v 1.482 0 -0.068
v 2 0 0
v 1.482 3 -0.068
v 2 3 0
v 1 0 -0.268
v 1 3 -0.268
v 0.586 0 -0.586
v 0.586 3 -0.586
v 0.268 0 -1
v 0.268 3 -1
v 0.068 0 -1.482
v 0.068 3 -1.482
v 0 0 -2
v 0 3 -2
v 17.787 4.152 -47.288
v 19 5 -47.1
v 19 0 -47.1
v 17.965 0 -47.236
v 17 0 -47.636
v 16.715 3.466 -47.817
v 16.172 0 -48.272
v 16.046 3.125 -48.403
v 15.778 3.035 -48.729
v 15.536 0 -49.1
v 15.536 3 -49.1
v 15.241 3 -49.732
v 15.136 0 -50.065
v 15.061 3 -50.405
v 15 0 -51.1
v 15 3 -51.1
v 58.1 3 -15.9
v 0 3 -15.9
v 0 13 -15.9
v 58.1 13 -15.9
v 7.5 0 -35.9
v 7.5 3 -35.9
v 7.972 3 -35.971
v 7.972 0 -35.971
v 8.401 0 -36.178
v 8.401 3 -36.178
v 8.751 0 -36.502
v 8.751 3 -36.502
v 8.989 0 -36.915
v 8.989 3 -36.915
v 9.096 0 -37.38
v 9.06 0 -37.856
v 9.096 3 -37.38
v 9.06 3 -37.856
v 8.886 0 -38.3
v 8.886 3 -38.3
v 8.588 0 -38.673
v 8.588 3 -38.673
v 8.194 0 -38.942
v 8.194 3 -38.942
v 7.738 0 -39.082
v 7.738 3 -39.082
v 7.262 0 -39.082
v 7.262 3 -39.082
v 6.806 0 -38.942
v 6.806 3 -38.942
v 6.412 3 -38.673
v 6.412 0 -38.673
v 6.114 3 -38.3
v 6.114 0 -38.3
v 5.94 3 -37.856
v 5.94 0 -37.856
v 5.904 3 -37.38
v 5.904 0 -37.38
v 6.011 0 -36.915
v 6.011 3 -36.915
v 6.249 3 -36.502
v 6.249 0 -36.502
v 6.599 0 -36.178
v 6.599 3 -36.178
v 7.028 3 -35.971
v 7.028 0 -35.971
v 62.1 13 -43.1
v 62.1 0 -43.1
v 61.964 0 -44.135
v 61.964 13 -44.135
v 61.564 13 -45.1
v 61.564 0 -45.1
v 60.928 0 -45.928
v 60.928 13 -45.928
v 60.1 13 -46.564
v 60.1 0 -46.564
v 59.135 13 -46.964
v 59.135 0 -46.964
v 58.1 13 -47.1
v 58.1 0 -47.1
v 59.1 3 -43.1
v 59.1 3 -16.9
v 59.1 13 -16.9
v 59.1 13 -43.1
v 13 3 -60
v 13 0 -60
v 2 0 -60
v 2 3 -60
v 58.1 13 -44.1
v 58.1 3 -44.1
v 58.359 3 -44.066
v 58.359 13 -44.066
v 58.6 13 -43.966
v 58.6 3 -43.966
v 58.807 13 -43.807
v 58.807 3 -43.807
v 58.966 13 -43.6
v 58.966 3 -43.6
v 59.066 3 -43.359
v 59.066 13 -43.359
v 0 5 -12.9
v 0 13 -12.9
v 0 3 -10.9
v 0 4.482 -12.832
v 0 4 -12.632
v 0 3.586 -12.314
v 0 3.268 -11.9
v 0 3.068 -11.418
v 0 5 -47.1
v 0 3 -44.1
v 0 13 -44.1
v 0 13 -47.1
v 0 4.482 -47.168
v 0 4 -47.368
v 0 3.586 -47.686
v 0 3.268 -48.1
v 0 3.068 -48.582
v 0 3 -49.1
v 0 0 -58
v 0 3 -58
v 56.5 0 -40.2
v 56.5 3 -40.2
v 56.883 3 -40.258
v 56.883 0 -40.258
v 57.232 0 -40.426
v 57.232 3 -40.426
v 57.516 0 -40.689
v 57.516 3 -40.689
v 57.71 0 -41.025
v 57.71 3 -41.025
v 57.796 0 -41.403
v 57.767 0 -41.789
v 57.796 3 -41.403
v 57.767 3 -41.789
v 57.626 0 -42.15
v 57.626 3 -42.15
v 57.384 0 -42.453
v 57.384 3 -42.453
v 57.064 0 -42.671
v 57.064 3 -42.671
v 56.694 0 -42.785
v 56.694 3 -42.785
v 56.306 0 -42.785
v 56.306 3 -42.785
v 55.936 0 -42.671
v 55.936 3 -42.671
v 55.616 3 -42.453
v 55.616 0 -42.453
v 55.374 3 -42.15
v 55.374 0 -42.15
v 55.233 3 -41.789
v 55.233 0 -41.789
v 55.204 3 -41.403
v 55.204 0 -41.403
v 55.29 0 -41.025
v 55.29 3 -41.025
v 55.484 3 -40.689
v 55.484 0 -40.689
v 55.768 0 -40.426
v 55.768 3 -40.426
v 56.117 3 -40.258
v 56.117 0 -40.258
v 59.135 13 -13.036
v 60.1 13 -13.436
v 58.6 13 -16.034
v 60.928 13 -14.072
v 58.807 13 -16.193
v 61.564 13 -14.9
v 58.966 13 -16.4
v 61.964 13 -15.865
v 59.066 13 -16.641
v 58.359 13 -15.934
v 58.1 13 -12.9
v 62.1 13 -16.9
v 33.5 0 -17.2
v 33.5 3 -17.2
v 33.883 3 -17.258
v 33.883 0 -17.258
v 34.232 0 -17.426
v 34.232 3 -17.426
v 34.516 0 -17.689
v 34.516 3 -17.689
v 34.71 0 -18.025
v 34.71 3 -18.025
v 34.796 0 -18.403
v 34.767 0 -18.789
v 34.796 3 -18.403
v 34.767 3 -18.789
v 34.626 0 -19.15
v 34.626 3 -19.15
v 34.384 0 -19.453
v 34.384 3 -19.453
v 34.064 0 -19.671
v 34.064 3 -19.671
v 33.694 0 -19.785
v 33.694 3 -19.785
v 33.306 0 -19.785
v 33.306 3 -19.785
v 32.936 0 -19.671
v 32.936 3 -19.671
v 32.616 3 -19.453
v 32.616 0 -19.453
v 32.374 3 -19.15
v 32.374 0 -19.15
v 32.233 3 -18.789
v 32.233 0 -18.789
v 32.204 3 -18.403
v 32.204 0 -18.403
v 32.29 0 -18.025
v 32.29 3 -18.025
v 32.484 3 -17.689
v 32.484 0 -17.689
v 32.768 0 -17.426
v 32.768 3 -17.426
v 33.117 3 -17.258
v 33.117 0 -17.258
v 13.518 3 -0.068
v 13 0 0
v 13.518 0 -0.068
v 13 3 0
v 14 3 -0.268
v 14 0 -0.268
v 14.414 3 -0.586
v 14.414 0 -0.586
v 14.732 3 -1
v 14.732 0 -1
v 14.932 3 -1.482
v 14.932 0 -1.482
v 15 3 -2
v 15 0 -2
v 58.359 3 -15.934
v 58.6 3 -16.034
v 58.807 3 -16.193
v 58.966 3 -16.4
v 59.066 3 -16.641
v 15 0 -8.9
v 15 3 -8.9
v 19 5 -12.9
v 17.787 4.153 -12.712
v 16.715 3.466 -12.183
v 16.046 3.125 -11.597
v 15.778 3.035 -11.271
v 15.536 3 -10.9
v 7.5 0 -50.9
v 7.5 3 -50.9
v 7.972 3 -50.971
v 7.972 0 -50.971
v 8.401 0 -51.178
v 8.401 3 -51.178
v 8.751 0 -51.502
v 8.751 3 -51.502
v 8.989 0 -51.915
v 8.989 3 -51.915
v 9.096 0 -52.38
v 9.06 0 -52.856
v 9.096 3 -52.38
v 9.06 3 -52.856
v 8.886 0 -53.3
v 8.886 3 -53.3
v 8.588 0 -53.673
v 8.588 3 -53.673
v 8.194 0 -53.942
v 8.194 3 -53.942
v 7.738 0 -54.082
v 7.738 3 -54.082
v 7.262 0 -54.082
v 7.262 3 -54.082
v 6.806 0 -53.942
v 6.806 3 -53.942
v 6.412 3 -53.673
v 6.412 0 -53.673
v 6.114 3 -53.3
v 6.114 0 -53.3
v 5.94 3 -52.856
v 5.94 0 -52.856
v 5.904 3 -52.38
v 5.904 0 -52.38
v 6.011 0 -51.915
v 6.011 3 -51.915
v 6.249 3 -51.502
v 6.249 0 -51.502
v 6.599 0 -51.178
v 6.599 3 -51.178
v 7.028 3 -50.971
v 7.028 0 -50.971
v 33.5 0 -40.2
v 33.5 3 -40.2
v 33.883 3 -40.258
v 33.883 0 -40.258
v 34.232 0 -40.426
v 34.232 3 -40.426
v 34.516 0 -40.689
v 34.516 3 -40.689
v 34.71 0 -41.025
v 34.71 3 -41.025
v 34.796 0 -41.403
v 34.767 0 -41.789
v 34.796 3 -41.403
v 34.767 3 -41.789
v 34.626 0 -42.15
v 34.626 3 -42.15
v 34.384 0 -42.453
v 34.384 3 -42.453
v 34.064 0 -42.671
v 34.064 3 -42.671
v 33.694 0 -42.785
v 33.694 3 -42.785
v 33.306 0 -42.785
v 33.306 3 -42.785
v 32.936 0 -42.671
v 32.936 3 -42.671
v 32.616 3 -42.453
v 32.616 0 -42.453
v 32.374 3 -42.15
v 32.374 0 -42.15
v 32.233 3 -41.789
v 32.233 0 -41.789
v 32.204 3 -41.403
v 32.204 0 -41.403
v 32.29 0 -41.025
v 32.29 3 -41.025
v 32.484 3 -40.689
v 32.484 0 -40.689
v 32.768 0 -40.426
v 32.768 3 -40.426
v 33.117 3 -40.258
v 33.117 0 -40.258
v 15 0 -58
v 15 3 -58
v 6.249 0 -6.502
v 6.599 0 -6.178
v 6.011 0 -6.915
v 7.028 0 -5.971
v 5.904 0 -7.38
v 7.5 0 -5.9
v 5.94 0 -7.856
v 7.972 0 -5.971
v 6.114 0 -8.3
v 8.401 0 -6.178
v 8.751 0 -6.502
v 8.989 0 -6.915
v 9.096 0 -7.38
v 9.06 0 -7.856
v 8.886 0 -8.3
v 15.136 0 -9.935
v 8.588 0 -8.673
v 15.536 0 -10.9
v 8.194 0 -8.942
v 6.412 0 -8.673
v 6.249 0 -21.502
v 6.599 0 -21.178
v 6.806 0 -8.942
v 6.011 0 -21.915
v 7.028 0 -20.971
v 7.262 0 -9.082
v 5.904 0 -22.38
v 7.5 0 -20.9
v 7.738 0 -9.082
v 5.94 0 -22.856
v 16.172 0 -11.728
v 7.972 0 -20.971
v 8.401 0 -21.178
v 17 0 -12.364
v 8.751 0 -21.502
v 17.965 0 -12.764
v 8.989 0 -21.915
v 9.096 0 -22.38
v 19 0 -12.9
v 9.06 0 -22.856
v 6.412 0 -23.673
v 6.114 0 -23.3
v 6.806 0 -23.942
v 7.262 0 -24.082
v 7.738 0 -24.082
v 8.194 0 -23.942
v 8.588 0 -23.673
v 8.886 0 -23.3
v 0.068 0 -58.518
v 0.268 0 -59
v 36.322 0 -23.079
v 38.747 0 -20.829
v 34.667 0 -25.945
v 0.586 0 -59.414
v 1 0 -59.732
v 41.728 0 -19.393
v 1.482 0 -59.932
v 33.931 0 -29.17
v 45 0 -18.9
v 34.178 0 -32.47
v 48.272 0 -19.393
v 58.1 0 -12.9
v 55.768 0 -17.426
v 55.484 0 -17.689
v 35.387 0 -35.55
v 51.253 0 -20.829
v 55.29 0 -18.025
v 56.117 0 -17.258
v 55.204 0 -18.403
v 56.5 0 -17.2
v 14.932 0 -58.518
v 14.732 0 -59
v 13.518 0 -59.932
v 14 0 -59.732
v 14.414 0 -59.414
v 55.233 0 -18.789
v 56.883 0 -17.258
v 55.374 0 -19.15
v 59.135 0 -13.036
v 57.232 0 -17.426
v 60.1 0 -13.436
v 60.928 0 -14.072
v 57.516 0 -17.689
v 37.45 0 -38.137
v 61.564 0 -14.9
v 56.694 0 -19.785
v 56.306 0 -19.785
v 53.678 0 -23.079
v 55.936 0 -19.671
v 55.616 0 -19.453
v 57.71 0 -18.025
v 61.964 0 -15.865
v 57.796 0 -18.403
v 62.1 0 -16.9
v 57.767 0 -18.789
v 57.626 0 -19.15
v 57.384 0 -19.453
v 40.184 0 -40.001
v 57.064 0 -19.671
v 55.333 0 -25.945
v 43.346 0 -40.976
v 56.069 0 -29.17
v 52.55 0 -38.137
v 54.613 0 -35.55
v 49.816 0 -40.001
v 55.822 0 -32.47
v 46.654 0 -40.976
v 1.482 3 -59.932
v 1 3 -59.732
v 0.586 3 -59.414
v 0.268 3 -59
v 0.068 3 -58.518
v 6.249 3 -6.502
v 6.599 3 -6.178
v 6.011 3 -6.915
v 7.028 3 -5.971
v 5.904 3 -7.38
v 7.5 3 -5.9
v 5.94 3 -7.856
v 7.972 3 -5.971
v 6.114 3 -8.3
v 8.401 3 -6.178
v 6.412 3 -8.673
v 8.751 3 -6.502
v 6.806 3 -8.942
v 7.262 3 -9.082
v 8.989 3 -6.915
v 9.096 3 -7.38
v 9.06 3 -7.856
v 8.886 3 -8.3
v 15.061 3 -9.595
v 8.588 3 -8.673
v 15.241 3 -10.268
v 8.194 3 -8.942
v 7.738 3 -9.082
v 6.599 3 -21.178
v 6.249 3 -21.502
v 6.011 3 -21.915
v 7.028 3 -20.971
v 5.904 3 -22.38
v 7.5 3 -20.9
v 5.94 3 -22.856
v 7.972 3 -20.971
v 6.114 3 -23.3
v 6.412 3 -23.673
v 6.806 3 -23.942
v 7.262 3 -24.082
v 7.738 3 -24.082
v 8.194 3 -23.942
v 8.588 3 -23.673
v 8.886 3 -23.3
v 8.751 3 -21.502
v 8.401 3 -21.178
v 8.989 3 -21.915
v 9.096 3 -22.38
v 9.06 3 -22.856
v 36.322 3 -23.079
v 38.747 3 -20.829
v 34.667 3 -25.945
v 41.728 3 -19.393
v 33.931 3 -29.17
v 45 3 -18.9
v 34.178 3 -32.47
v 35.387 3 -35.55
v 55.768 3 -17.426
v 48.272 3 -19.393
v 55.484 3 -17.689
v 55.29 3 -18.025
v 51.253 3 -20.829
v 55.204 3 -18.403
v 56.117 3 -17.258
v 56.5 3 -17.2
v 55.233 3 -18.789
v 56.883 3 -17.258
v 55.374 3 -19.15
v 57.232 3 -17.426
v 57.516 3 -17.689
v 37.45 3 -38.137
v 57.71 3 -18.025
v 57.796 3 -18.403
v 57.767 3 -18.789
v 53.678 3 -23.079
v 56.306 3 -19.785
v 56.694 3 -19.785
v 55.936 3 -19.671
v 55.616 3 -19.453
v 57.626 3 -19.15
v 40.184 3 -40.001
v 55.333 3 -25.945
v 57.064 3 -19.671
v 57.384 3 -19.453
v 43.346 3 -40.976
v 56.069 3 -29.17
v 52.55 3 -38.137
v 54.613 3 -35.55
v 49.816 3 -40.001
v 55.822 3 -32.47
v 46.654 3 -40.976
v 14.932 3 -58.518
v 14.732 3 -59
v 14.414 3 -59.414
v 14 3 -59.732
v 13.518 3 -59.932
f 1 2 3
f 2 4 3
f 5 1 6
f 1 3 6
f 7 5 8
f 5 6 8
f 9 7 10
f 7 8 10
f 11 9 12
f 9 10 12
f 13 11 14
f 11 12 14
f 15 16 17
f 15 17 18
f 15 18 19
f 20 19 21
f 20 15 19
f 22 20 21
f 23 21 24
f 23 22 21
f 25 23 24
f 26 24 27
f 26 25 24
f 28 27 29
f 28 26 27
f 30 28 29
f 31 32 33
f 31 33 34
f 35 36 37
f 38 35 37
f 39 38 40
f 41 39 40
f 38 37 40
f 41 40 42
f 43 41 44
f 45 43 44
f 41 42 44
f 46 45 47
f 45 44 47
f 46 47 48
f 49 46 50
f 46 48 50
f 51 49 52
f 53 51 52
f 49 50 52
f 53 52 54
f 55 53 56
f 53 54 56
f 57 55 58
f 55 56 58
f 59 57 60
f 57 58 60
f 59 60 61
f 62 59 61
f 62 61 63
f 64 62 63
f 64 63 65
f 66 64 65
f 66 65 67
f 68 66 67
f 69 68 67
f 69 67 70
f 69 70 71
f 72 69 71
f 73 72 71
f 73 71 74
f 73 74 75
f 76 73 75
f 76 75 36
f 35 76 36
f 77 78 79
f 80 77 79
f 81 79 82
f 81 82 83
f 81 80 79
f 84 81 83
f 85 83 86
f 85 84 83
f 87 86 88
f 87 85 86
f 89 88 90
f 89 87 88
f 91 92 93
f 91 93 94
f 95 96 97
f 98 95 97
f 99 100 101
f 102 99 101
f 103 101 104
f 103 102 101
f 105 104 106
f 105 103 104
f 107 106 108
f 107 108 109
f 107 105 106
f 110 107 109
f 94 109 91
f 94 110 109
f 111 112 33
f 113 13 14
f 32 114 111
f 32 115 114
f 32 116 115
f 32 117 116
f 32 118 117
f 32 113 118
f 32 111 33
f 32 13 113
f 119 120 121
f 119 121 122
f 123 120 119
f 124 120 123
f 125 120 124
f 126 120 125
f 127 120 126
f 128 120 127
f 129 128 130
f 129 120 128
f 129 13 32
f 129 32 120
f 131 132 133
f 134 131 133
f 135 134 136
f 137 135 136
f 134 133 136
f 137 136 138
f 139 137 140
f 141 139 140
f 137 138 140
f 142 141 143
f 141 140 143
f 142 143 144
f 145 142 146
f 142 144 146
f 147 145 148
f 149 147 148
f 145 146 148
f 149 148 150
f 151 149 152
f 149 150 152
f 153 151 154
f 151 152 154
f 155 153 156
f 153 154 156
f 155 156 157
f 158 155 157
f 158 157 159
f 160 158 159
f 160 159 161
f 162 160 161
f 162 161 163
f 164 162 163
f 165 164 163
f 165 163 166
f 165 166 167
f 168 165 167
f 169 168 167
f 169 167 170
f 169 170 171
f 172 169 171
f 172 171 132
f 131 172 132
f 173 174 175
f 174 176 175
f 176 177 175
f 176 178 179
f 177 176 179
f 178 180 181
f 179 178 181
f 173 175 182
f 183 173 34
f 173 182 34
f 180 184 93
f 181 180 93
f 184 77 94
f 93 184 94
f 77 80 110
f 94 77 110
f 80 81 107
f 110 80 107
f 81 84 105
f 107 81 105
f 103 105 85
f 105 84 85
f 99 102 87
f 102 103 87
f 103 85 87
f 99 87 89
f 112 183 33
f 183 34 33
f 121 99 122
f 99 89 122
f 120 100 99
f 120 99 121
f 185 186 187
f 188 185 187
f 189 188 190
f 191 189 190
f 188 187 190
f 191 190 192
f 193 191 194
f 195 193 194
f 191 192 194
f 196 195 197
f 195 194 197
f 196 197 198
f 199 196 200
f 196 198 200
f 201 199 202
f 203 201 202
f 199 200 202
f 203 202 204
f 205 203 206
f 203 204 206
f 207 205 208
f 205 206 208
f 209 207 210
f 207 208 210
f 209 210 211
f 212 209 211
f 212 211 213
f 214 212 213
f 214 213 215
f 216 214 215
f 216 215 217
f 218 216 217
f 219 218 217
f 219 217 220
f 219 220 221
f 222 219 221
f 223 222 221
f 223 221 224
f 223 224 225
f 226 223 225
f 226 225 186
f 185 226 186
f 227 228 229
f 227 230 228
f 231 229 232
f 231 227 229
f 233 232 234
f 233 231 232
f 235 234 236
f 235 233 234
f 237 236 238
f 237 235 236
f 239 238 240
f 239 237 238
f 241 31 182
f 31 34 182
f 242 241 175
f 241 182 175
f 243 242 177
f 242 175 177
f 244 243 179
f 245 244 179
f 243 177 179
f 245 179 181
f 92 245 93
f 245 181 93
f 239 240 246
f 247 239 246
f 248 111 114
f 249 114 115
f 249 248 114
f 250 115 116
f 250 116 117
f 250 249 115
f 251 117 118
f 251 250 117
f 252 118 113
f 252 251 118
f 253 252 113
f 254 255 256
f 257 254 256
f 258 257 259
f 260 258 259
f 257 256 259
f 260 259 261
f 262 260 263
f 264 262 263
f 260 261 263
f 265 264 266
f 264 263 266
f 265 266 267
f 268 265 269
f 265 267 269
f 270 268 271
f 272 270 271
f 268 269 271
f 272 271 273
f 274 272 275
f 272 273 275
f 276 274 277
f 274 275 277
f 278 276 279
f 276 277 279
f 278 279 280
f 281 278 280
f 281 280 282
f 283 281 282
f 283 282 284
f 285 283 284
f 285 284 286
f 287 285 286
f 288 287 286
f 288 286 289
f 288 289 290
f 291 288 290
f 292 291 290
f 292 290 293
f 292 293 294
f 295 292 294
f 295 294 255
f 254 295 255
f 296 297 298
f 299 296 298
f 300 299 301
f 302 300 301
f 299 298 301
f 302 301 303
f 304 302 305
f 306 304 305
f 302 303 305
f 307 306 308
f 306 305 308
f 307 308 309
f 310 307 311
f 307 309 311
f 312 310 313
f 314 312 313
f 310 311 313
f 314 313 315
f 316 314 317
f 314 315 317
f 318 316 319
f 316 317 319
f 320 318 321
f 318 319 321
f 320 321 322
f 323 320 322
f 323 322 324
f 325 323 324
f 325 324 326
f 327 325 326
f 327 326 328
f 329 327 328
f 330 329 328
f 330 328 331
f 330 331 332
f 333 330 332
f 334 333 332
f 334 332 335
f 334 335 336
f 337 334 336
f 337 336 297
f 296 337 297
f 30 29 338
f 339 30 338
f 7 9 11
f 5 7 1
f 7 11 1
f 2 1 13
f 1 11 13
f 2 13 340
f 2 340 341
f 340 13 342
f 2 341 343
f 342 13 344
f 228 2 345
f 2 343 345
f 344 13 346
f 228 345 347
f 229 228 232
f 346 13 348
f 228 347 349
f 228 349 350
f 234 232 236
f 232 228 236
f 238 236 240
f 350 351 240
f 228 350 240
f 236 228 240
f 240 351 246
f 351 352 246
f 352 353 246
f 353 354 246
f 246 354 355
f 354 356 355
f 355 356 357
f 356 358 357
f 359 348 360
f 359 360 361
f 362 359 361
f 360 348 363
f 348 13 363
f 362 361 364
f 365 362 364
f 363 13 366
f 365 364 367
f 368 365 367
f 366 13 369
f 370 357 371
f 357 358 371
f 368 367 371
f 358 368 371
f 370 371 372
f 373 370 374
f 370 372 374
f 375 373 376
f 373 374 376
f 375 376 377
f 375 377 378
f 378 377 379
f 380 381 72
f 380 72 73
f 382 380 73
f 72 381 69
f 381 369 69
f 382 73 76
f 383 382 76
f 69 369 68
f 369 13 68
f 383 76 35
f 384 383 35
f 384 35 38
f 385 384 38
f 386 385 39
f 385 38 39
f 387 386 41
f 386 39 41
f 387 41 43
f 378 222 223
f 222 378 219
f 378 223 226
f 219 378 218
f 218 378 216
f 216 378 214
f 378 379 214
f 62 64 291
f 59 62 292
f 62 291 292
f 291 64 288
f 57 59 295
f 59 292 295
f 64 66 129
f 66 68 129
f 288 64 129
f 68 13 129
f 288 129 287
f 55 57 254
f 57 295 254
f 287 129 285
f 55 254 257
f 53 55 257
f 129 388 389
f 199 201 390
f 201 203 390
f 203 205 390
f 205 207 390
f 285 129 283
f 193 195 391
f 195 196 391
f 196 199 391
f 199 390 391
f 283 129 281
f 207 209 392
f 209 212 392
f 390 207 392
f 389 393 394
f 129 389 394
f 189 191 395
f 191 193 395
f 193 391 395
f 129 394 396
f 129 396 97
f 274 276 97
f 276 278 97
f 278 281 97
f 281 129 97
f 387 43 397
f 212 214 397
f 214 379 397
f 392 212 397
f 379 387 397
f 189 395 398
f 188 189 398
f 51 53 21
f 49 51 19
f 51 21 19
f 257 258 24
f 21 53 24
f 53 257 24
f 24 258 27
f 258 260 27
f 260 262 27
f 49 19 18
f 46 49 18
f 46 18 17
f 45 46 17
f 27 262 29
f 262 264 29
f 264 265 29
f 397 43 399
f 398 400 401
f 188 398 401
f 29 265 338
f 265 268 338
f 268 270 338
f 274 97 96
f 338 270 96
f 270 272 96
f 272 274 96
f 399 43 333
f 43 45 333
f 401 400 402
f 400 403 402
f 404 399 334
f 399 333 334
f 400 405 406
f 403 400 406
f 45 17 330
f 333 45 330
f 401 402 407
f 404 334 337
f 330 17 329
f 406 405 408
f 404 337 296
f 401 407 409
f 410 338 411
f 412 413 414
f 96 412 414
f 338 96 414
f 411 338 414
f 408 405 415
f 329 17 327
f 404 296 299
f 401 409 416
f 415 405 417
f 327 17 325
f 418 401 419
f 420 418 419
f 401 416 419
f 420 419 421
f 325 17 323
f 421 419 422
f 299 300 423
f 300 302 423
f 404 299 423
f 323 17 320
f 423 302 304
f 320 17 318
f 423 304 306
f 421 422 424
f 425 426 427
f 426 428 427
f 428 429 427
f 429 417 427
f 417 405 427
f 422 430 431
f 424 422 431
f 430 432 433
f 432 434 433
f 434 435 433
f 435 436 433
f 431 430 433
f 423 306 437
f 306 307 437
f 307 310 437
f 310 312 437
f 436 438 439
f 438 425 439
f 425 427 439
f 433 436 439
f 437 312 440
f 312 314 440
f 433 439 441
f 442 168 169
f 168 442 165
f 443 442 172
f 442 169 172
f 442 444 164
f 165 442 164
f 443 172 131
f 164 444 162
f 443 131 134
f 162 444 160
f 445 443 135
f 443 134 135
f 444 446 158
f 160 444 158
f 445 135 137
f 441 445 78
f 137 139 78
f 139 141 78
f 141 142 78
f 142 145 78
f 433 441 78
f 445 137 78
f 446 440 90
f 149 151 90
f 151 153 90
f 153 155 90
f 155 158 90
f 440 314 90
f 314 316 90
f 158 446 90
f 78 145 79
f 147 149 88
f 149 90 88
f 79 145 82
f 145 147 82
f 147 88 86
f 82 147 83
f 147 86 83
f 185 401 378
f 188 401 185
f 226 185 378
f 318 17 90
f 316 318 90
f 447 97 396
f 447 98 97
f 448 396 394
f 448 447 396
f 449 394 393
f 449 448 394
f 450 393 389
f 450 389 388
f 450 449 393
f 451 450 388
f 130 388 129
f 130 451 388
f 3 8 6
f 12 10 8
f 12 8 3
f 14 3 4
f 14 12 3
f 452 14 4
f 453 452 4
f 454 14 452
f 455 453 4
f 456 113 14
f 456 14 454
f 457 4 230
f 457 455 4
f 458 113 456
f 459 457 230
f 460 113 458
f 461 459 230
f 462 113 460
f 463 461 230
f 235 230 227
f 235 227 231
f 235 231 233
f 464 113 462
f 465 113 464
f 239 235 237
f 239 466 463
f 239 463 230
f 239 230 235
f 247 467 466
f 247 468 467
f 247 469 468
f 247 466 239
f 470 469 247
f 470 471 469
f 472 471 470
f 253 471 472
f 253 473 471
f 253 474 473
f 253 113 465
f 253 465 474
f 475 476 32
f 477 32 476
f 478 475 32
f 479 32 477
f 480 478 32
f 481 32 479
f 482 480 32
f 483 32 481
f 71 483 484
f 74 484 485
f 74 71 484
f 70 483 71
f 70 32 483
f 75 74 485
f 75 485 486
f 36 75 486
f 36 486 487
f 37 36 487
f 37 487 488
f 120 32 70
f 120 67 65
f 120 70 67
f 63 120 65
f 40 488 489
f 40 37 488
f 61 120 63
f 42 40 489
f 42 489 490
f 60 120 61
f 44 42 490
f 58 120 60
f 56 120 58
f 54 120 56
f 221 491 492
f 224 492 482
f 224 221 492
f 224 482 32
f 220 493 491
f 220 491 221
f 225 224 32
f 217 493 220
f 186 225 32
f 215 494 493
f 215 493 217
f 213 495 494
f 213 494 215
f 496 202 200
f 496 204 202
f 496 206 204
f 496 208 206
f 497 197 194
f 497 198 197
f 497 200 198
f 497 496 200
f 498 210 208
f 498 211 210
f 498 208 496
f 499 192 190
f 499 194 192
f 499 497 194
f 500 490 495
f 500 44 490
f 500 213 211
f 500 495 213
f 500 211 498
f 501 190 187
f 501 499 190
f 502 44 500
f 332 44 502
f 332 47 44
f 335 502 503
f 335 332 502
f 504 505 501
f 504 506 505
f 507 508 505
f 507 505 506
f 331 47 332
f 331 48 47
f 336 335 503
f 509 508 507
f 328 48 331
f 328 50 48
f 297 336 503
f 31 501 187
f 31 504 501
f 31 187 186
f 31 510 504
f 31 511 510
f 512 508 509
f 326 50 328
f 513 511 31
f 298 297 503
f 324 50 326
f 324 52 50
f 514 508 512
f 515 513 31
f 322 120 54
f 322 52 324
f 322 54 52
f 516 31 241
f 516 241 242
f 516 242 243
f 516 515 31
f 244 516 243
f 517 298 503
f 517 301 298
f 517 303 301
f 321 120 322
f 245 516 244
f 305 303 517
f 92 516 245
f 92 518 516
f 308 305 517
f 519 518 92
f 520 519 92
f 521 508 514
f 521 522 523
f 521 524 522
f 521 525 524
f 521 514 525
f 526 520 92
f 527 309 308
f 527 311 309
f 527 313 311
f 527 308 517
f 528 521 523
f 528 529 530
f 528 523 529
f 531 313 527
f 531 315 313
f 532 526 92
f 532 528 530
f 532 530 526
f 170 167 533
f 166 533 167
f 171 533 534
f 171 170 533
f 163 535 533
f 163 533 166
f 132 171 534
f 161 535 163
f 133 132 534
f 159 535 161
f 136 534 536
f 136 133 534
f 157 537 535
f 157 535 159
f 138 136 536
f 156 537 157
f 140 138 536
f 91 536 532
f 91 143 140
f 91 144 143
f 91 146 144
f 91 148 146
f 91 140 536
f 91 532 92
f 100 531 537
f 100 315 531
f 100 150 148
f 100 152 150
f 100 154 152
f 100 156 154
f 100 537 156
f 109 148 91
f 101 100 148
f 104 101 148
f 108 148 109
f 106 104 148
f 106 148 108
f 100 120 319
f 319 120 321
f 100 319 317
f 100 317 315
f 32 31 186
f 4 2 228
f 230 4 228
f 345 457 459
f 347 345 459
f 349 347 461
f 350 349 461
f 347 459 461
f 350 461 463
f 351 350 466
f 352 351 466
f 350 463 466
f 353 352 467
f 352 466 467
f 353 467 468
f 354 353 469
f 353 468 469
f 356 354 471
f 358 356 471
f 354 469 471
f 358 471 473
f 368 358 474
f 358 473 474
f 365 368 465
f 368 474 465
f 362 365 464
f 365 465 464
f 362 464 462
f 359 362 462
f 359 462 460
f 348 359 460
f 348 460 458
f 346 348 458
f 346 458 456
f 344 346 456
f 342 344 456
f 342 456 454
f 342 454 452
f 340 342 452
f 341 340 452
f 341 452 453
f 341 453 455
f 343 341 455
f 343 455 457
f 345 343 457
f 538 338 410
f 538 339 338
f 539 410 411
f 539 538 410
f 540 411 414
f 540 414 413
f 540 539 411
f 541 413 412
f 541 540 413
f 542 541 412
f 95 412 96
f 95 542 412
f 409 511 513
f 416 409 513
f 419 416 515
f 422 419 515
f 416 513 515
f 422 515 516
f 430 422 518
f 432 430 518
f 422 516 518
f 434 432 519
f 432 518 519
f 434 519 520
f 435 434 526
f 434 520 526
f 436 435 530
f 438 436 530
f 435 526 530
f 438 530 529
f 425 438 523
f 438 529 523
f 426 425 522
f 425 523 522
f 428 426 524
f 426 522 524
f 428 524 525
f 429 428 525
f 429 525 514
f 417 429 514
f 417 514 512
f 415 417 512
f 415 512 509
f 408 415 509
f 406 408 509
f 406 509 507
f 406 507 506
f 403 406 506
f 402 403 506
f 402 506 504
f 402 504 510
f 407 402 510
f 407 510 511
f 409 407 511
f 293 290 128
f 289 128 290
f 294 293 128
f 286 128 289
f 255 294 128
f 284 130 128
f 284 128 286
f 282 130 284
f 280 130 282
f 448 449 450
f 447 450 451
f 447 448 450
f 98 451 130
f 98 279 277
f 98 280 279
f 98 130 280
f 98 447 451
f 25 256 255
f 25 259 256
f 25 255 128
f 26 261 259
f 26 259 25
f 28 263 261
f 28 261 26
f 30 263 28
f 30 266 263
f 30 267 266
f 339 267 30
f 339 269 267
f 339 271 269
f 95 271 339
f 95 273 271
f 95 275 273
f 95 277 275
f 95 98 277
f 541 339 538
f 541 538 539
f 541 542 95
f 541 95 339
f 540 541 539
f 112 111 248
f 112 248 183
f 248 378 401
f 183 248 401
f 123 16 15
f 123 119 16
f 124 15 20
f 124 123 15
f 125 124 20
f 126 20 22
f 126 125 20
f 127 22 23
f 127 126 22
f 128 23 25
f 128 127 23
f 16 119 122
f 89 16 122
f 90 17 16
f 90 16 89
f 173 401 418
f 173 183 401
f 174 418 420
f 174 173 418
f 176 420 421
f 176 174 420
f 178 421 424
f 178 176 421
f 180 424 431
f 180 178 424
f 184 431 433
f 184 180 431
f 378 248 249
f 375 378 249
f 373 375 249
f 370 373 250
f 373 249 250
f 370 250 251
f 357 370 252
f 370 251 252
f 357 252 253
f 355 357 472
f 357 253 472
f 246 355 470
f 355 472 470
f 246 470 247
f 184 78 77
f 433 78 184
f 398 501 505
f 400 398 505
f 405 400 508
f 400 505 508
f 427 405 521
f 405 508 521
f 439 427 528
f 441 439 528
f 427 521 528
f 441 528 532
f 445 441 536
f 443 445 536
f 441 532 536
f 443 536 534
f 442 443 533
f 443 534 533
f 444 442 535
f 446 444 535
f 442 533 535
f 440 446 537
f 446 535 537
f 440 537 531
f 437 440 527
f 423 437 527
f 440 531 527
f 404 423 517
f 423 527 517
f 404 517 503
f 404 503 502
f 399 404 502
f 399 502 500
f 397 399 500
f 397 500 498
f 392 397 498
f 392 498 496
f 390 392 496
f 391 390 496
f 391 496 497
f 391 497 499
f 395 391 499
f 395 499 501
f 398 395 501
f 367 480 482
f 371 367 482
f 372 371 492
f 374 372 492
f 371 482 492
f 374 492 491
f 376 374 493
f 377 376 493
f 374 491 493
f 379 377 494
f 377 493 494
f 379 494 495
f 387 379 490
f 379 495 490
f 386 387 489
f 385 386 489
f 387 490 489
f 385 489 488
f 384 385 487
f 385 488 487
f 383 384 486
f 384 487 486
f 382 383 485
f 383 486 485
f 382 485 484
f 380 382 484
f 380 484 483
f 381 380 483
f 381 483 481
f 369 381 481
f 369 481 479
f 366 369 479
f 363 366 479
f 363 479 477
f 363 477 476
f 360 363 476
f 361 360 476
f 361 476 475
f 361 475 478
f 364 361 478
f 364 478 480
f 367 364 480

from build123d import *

# Parameters (mm, degrees)
BOSS_EXTRUDE1_DEPTH = 3
SKETCH2_R           = 1.6
CUT_EXTRUDE1_DEPTH  = 87.402604127
BOSS_EXTRUDE2_DEPTH = 10
CUT_EXTRUDE2_REACH  = 88.928
SKETCH5_R           = 11.1
CUT_EXTRUDE3_REACH  = 88.928
SKETCH6_R           = 1.3
FILLET1_R           = 1
FILLET2_R           = 4
FILLET3_R           = 4
FILLET4_R           = 2
FILLET5_R           = 2


with BuildPart() as part:
    # Sketch1 → Boss-Extrude1 (new body)
    with BuildSketch(Plane(origin=(0, 0, 0), x_dir=(1, 0, 0), z_dir=(0, 1, 0))):
        Polygon((0, 0), (15, 0), (15, 12.9), (62.1, 12.9), (62.1, 47.1), (15, 47.1), (15, 60), (0, 60), align=None)
    extrude(amount=BOSS_EXTRUDE1_DEPTH)

    # Sketch2 → Cut-Extrude1 (cut, through all)
    with BuildSketch(Plane(origin=(0, 3, 0), x_dir=(1, 0, 0), z_dir=(0, 1, 0))):
        with Locations(Location((7.5, 52.5, 0), (0, 0, 270))):
            Circle(SKETCH2_R)
        with Locations(Location((7.5, 37.5, 0), (0, 0, 270))):
            Circle(SKETCH2_R)
        with Locations(Location((7.5, 7.5, 0), (0, 0, 270))):
            Circle(SKETCH2_R)
        with Locations(Location((7.5, 22.5, 0), (0, 0, 270))):
            Circle(SKETCH2_R)
    extrude(amount=-CUT_EXTRUDE1_DEPTH, mode=Mode.SUBTRACT)

    # Sketch3 → Boss-Extrude2 (add)
    with BuildSketch(Plane(origin=(0, 3, 0), x_dir=(1, 0, 0), z_dir=(0, 1, 0))):
        Polygon((62.1, 12.9), (15, 12.9), (0, 12.9), (0, 15.9), (59.1, 15.9), (59.1, 44.1), (0, 44.1), (0, 47.1), (62.1, 47.1), align=None)
    extrude(amount=BOSS_EXTRUDE2_DEPTH)

    # Sketch5 → Cut-Extrude2 (cut, up to next)
    with BuildSketch(Plane(origin=(0, 3, 0), x_dir=(1, 0, 0), z_dir=(0, 1, 0)), mode=Mode.PRIVATE) as cut_extrude2_sk1:
        with Locations(Location((45, 30, 0), (0, 0, 270))):
            Circle(SKETCH5_R)
    cut_extrude2_tool1 = extrude(cut_extrude2_sk1.sketch, amount=-CUT_EXTRUDE2_REACH, mode=Mode.PRIVATE) & part.part
    add(cut_extrude2_tool1.solids().sort_by_distance((45, 3, -30))[0], mode=Mode.SUBTRACT)

    # Sketch6 → Cut-Extrude3 (cut, up to next)
    with BuildSketch(Plane(origin=(0, 3, 0), x_dir=(1, 0, 0), z_dir=(0, 1, 0)), mode=Mode.PRIVATE) as cut_extrude3_sk1:
        with Locations(Location((56.5, 41.5, 0), (0, 0, 270))):
            Circle(SKETCH6_R)
    cut_extrude3_tool1 = extrude(cut_extrude3_sk1.sketch, amount=-CUT_EXTRUDE3_REACH, mode=Mode.PRIVATE) & part.part
    # Sketch6 → Cut-Extrude3 (cut, up to next)
    with BuildSketch(Plane(origin=(0, 3, 0), x_dir=(1, 0, 0), z_dir=(0, 1, 0)), mode=Mode.PRIVATE) as cut_extrude3_sk2:
        with Locations(Location((33.5, 41.5, 0), (0, 0, 270))):
            Circle(SKETCH6_R)
    cut_extrude3_tool2 = extrude(cut_extrude3_sk2.sketch, amount=-CUT_EXTRUDE3_REACH, mode=Mode.PRIVATE) & part.part
    # Sketch6 → Cut-Extrude3 (cut, up to next)
    with BuildSketch(Plane(origin=(0, 3, 0), x_dir=(1, 0, 0), z_dir=(0, 1, 0)), mode=Mode.PRIVATE) as cut_extrude3_sk3:
        with Locations(Location((33.5, 18.5, 0), (0, 0, 270))):
            Circle(SKETCH6_R)
    cut_extrude3_tool3 = extrude(cut_extrude3_sk3.sketch, amount=-CUT_EXTRUDE3_REACH, mode=Mode.PRIVATE) & part.part
    # Sketch6 → Cut-Extrude3 (cut, up to next)
    with BuildSketch(Plane(origin=(0, 3, 0), x_dir=(1, 0, 0), z_dir=(0, 1, 0)), mode=Mode.PRIVATE) as cut_extrude3_sk4:
        with Locations(Location((56.5, 18.5, 0), (0, 0, 270))):
            Circle(SKETCH6_R)
    cut_extrude3_tool4 = extrude(cut_extrude3_sk4.sketch, amount=-CUT_EXTRUDE3_REACH, mode=Mode.PRIVATE) & part.part
    add(cut_extrude3_tool1.solids().sort_by_distance((56.5, 3, -41.5))[0], mode=Mode.SUBTRACT)
    add(cut_extrude3_tool2.solids().sort_by_distance((33.5, 3, -41.5))[0], mode=Mode.SUBTRACT)
    add(cut_extrude3_tool3.solids().sort_by_distance((33.5, 3, -18.5))[0], mode=Mode.SUBTRACT)
    add(cut_extrude3_tool4.solids().sort_by_distance((56.5, 3, -18.5))[0], mode=Mode.SUBTRACT)

    # Fillet1
    fillet1_edges = [part.edges().sort_by_distance(p)[0] for p in [
        (59.1, 8, -44.1),
        (59.1, 8, -15.9),
    ]]
    fillet(fillet1_edges, radius=FILLET1_R)

    # Fillet2
    fillet2_edges = [part.edges().sort_by_distance(p)[0] for p in [
        (62.1, 6.5, -47.1),
        (62.1, 6.5, -12.9),
    ]]
    fillet(fillet2_edges, radius=FILLET2_R)

    # Fillet3
    fillet3_edges = [part.edges().sort_by_distance(p)[0] for p in [
        (15, 1.5, -47.1),
        (15, 1.5, -12.9),
    ]]
    fillet(fillet3_edges, radius=FILLET3_R)

    # Fillet4
    fillet4_edges = [part.edges().sort_by_distance(p)[0] for p in [
        (9.5, 3, -47.1),
        (9.5, 3, -12.9),
    ]]
    fillet(fillet4_edges, radius=FILLET4_R)

    # Fillet5
    fillet5_edges = [part.edges().sort_by_distance(p)[0] for p in [
        (0, 1.5, -60),
        (15, 1.5, -60),
        (15, 1.5, 0),
        (0, 1.5, 0),
    ]]
    fillet(fillet5_edges, radius=FILLET5_R)


solid = part.part
